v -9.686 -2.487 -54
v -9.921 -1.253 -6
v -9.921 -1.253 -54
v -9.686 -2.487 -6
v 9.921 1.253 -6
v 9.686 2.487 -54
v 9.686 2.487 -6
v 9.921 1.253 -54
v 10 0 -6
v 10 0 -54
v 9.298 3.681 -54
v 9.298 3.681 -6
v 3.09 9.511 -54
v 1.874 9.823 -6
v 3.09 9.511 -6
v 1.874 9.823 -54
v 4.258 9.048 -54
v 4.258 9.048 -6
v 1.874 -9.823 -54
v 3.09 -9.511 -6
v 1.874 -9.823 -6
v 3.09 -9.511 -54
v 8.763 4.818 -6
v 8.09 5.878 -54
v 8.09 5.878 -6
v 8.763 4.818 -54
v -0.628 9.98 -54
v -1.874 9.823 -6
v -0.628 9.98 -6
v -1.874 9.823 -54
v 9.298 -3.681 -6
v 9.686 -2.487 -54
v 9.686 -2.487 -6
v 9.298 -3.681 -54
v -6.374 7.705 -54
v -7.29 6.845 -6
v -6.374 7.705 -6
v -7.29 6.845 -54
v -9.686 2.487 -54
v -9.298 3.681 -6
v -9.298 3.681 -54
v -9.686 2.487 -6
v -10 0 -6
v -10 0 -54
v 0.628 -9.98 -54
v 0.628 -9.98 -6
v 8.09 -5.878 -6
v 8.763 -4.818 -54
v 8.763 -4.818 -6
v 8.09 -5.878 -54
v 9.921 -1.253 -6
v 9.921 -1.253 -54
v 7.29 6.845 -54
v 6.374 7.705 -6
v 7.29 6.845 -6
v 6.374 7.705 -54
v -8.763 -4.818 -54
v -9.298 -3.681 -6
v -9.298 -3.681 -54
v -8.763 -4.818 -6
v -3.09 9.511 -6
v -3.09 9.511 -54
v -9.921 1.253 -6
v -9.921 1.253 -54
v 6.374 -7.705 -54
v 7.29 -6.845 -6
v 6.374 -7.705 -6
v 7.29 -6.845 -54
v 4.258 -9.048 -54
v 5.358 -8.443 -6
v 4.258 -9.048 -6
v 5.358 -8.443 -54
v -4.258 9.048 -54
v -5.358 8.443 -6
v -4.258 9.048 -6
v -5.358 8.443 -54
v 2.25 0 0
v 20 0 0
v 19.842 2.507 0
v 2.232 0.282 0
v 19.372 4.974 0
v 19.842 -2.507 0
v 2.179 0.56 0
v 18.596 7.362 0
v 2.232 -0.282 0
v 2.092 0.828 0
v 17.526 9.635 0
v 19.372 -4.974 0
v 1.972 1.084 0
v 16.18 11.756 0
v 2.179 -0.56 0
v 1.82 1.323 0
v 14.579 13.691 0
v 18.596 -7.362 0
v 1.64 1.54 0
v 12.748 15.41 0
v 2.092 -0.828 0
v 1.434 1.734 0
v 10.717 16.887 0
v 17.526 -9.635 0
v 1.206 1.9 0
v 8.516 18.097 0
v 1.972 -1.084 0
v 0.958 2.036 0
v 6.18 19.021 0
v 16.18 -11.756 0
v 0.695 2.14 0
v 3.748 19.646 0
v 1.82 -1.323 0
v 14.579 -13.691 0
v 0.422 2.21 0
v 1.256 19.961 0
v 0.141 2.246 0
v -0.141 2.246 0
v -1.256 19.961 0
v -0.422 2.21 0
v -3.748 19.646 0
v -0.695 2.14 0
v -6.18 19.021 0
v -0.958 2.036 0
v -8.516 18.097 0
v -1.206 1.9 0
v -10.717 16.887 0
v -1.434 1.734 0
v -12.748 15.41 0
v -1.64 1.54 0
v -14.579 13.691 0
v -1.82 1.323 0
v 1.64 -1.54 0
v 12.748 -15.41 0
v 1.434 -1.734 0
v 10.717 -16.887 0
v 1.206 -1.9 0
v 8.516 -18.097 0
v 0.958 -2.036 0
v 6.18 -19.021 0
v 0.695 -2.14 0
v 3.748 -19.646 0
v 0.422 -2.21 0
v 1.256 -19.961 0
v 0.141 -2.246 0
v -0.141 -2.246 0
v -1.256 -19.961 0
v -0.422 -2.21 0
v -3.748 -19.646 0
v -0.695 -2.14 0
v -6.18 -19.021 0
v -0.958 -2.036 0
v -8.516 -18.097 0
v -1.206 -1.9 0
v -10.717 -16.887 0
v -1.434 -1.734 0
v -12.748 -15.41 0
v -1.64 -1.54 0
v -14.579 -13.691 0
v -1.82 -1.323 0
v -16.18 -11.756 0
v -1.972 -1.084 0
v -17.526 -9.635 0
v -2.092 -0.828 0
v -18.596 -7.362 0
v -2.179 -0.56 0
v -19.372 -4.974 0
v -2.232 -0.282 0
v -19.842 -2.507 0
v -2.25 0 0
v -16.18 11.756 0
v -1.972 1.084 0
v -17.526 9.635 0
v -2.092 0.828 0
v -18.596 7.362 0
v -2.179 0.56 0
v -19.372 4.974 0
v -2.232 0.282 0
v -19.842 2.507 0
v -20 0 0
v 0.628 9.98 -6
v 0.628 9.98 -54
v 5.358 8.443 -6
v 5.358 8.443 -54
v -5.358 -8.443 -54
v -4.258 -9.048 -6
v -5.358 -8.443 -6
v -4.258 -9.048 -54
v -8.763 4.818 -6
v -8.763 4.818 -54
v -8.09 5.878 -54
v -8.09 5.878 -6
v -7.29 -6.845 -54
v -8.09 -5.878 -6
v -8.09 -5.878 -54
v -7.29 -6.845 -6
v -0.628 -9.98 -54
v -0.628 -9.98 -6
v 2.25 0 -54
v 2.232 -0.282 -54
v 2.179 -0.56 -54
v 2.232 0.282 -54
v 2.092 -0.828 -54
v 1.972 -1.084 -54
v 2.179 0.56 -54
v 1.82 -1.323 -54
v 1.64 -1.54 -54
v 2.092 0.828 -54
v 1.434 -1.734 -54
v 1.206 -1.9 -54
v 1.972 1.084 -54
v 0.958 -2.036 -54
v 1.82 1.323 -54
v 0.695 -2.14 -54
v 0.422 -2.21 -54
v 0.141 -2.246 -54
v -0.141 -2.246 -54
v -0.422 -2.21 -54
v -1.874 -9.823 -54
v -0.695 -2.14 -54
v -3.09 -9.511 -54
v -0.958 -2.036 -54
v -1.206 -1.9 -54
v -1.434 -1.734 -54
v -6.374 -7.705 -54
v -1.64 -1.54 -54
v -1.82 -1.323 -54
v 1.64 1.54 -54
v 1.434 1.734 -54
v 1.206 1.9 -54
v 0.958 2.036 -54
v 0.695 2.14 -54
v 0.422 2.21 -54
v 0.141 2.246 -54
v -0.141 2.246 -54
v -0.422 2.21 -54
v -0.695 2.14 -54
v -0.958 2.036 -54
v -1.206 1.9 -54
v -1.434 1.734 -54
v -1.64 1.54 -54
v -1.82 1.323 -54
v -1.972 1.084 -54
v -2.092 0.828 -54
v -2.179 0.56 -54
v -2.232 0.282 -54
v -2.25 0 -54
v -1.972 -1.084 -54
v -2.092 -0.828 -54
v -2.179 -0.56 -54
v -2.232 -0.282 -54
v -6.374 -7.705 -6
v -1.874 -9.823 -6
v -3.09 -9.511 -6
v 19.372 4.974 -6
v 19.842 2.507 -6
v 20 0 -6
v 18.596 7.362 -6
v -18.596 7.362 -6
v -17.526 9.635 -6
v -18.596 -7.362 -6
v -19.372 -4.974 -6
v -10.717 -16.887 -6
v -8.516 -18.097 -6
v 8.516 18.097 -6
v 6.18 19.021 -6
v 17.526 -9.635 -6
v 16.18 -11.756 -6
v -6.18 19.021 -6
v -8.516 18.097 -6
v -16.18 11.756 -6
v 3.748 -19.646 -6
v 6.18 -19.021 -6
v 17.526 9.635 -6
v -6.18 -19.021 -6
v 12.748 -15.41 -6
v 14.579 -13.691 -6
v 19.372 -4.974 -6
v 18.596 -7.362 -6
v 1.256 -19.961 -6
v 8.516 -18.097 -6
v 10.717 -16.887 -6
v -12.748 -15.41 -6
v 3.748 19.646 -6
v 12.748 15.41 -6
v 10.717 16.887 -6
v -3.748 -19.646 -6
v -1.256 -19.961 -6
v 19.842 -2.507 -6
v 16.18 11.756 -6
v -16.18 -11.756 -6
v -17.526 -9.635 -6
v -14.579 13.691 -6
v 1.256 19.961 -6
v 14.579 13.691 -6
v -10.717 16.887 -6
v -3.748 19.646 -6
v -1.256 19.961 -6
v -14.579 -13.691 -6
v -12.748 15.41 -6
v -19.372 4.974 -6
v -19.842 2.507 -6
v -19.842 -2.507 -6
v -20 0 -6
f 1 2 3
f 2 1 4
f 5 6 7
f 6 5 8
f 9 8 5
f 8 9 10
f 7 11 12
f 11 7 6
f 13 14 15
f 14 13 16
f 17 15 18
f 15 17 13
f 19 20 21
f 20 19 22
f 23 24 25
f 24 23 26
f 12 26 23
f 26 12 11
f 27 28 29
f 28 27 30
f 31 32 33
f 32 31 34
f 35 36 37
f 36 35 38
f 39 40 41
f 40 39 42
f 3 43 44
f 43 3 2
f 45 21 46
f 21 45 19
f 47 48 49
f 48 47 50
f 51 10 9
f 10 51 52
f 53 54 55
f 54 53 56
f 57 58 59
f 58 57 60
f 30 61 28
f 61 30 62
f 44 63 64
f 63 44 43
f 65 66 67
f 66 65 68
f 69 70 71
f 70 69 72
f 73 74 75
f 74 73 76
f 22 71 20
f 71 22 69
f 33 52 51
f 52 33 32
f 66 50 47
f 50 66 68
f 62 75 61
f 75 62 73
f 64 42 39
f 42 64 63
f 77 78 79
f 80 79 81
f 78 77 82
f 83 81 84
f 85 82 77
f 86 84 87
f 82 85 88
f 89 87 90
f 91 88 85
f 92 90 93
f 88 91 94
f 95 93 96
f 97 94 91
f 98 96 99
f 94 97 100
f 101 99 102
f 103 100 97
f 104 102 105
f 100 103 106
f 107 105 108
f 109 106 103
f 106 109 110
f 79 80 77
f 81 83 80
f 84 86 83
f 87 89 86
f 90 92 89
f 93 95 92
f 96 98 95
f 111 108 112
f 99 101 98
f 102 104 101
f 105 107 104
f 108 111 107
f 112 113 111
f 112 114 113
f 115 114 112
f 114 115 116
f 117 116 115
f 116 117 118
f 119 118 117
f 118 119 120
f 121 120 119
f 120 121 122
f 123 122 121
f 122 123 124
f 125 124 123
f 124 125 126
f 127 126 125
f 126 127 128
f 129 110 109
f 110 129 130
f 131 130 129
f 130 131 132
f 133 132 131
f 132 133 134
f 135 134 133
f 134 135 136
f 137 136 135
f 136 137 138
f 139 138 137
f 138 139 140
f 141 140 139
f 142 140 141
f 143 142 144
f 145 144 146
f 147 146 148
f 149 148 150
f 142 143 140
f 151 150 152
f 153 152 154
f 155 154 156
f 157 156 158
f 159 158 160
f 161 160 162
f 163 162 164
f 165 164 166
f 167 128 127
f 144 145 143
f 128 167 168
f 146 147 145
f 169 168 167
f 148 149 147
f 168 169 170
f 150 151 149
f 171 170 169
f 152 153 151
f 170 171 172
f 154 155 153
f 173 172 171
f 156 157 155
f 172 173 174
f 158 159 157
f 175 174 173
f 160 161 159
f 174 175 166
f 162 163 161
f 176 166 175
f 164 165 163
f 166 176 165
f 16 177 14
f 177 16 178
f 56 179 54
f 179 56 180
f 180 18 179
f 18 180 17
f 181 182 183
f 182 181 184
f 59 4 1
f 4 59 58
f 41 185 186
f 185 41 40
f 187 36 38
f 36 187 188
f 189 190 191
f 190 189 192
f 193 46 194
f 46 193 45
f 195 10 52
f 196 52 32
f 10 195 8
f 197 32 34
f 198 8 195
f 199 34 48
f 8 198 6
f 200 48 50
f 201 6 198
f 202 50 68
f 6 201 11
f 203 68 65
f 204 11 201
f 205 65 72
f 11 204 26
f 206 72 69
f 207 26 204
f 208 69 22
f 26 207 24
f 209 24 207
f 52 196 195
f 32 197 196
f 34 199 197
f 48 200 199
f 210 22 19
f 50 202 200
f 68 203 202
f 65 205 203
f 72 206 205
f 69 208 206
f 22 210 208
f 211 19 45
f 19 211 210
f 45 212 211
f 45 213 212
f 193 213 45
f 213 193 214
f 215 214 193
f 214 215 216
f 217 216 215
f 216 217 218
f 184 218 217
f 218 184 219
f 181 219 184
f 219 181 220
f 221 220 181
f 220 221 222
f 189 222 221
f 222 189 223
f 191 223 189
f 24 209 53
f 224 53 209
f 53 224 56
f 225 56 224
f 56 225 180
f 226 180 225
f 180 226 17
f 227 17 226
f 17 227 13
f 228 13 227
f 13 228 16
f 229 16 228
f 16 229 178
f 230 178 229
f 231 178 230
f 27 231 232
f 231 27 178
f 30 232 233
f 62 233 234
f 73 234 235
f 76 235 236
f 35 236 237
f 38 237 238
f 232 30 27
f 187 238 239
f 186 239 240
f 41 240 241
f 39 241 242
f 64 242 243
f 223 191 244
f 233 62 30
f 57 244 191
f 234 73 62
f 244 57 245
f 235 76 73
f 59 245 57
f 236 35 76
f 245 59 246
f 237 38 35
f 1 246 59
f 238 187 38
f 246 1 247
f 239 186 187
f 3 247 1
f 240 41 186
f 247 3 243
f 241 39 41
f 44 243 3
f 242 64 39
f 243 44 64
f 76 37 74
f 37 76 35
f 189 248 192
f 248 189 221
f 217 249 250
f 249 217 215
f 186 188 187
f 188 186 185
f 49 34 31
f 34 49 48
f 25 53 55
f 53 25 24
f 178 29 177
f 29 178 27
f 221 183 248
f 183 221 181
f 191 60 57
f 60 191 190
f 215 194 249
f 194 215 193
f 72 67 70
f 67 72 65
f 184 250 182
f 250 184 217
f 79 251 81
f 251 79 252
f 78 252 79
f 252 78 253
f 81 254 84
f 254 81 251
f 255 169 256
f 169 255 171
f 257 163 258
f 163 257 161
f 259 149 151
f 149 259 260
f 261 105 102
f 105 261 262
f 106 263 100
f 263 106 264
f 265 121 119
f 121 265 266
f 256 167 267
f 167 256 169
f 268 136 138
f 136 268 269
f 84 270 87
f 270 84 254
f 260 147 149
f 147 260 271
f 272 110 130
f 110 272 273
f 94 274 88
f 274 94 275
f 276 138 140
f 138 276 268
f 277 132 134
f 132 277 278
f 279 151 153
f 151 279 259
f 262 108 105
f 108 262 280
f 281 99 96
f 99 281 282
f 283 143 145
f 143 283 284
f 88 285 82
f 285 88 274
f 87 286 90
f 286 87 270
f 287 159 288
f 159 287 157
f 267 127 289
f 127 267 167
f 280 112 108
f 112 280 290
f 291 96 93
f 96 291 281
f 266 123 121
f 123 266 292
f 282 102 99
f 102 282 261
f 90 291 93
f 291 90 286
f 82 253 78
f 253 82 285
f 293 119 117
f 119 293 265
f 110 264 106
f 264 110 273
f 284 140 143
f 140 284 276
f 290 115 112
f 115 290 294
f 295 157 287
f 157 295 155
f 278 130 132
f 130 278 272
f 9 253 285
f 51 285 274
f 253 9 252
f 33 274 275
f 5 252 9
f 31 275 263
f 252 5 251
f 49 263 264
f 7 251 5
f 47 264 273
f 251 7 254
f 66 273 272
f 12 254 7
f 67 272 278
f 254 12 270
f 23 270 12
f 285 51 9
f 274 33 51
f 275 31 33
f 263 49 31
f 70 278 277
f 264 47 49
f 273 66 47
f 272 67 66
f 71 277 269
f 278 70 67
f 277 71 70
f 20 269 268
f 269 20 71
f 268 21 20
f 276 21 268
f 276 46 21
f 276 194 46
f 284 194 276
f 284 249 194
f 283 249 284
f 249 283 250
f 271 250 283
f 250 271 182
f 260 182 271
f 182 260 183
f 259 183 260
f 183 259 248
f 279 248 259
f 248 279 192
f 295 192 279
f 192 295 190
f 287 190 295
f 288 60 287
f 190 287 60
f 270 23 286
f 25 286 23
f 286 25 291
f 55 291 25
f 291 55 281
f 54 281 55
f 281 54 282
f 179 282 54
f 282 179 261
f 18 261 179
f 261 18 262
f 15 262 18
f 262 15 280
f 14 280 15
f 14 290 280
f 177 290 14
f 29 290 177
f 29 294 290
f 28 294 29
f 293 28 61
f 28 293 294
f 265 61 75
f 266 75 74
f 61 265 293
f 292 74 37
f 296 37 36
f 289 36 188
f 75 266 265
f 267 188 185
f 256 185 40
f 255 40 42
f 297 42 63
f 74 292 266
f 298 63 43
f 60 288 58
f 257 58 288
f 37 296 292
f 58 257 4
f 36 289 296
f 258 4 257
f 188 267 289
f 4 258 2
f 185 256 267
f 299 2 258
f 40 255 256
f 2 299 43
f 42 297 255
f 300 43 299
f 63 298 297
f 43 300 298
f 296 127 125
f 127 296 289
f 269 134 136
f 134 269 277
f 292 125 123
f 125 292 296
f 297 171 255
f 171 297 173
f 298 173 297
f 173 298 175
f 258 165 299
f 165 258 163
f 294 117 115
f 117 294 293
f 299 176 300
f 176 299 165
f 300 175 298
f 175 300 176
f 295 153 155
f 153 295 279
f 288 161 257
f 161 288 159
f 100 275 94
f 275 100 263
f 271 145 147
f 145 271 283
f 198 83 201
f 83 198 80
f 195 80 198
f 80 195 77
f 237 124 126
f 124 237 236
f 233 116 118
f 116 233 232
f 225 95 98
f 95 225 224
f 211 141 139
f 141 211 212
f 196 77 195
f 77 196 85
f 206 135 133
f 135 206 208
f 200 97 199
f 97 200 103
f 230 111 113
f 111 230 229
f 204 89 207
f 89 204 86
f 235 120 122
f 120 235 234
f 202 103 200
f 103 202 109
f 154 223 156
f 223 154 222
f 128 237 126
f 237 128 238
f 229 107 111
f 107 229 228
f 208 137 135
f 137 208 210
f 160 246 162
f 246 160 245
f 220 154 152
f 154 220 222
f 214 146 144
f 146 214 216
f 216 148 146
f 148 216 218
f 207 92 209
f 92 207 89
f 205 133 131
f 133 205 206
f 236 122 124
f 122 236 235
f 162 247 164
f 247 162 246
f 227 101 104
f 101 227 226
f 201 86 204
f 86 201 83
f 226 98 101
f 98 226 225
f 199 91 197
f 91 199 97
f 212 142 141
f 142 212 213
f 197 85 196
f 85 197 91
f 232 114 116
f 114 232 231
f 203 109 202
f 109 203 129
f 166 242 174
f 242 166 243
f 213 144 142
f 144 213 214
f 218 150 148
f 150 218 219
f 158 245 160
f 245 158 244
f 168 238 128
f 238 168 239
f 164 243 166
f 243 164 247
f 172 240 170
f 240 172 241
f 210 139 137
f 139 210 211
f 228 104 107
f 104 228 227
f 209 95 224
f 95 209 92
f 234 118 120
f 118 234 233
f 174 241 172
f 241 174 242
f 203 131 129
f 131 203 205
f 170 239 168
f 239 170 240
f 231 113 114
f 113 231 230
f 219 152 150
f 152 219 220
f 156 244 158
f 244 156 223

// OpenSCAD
$fn = 50;


difference() {
	union() {
		translate(v = [0, 0, -54.0000000000]) {
			cylinder(h = 54, r = 10.0000000000);
		}
		translate(v = [0, 0, -6.0000000000]) {
			cylinder(h = 6, r = 20.0000000000);
		}
	}
	union() {
		#translate(v = [0, 0, -54]) {
			cylinder(h = 54, r = 2.2500000000);
		}
	}
}
